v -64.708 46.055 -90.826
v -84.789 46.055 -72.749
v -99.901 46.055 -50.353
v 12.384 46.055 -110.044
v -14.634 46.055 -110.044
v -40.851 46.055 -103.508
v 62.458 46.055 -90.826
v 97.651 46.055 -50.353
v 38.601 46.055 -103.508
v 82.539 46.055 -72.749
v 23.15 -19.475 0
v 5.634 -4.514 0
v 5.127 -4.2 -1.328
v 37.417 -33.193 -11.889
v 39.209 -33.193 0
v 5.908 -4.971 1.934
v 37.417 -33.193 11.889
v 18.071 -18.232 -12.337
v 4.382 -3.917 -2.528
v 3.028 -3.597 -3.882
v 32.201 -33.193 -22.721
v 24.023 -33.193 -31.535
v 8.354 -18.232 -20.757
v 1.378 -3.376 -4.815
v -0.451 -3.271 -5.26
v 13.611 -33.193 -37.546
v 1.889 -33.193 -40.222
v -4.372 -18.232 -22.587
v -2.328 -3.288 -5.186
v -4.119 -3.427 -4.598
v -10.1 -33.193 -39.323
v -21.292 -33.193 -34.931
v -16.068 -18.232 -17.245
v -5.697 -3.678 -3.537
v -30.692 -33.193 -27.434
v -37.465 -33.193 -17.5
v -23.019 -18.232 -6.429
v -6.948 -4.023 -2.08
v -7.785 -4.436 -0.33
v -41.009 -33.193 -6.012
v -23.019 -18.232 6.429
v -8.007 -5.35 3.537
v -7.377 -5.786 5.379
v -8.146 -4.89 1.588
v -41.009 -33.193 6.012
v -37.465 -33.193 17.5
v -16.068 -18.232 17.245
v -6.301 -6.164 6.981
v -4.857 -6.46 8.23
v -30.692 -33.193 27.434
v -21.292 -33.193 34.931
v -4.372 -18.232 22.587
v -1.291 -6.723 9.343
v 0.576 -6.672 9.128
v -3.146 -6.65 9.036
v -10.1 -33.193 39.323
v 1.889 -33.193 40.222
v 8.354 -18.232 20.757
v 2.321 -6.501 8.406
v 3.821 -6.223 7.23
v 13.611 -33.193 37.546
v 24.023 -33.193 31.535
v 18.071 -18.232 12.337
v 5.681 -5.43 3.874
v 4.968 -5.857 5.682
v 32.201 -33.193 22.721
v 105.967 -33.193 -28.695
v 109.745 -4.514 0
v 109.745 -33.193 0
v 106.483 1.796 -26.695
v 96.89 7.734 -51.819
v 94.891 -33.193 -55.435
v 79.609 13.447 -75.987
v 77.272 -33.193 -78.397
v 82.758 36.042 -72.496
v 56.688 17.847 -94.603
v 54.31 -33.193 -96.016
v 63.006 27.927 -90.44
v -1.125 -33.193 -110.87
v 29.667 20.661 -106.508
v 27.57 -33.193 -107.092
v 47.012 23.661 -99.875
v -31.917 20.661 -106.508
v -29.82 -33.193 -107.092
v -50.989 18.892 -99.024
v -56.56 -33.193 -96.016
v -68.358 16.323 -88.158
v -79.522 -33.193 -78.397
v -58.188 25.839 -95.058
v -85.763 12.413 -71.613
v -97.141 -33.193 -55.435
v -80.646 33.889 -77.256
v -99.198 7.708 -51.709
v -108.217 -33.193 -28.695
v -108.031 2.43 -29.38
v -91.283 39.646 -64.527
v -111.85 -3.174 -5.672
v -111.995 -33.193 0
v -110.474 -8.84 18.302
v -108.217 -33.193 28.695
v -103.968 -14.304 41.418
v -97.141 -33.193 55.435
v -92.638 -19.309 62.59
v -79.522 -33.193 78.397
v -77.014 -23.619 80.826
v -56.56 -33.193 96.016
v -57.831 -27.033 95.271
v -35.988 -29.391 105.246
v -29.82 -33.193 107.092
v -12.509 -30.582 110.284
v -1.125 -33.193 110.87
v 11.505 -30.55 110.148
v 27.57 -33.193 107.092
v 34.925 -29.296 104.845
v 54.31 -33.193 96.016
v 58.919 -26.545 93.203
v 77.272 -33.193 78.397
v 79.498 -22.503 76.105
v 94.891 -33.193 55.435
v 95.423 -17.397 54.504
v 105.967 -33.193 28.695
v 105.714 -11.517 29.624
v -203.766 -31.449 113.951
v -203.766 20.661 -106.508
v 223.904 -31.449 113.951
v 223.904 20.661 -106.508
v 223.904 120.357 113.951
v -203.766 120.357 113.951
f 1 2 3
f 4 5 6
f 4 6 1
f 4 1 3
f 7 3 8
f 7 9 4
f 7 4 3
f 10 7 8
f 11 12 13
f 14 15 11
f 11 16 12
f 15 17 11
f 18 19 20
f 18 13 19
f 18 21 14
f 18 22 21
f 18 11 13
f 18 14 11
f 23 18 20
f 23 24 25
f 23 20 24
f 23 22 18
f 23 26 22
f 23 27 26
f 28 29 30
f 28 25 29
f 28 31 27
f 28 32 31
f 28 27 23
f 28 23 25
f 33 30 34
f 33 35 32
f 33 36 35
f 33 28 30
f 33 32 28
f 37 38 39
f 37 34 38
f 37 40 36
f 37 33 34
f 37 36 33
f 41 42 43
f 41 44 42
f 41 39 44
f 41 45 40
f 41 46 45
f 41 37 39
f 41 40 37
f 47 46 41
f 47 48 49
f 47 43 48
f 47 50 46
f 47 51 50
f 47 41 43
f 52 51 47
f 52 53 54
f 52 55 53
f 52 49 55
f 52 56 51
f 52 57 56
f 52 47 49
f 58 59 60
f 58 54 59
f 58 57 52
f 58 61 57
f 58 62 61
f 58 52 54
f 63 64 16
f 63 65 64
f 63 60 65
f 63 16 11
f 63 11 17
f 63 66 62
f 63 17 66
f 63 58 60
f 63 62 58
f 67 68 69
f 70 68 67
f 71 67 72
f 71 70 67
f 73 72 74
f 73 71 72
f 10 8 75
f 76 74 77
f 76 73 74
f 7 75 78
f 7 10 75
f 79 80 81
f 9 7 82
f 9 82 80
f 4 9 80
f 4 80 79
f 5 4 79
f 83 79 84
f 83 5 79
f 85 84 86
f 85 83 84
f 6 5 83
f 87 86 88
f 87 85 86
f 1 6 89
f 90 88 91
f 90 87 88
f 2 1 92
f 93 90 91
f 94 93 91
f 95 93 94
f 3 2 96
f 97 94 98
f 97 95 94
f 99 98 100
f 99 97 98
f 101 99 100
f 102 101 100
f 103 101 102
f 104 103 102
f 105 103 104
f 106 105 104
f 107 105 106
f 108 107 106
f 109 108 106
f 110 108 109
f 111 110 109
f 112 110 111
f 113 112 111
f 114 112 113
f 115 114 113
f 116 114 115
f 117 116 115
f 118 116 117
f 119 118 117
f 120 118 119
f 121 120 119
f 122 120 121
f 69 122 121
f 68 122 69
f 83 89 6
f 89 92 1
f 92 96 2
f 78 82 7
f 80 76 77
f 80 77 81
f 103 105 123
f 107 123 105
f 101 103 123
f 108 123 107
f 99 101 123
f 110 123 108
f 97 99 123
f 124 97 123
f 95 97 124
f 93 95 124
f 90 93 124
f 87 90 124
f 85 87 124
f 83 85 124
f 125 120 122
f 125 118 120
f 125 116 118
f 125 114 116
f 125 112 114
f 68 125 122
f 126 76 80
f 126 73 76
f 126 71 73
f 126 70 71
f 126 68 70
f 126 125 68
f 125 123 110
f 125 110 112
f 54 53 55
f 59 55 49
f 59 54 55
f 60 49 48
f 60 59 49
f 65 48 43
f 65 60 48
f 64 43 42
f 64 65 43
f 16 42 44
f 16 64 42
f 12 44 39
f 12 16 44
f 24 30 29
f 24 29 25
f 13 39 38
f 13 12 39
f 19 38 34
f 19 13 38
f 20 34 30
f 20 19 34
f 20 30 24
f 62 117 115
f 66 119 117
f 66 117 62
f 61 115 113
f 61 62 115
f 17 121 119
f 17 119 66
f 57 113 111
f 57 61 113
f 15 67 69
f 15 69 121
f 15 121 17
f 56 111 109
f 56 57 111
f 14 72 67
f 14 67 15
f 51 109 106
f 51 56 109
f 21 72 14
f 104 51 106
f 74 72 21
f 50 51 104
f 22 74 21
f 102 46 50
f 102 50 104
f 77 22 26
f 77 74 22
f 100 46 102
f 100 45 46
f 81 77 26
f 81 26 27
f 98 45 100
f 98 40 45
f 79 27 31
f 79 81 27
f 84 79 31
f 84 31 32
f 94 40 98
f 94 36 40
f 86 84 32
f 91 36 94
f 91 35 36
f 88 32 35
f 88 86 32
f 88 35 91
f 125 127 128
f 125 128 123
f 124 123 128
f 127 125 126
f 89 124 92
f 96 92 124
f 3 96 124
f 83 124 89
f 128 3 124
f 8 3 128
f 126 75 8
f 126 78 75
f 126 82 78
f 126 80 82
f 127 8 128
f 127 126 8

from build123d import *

# Parameters (mm, degrees)
F5_DEPTH = 427.669525


with BuildPart() as f2:
    # F0 (on Top) → F2 (revolve)
    with BuildSketch(Plane.XY):
        Polygon((46.470374, 46.055496), (-0.622407, 0.829846), (39.209366, -33.193126), (109.744787, -33.193126), (109.744787, 46.055496), align=None)
    revolve(axis=Axis((-1.124948, 46.980426, 0), (0, 1, 0)))

    # F4 (on offset) → F5 (join)
    with BuildSketch(Plane.YZ.offset(223.903775)):
        Polygon((120.357007, 113.951385), (-31.448789, 113.951385), (20.660924, -106.508024), align=None)
    extrude(amount=-F5_DEPTH)


solid = f2.part
